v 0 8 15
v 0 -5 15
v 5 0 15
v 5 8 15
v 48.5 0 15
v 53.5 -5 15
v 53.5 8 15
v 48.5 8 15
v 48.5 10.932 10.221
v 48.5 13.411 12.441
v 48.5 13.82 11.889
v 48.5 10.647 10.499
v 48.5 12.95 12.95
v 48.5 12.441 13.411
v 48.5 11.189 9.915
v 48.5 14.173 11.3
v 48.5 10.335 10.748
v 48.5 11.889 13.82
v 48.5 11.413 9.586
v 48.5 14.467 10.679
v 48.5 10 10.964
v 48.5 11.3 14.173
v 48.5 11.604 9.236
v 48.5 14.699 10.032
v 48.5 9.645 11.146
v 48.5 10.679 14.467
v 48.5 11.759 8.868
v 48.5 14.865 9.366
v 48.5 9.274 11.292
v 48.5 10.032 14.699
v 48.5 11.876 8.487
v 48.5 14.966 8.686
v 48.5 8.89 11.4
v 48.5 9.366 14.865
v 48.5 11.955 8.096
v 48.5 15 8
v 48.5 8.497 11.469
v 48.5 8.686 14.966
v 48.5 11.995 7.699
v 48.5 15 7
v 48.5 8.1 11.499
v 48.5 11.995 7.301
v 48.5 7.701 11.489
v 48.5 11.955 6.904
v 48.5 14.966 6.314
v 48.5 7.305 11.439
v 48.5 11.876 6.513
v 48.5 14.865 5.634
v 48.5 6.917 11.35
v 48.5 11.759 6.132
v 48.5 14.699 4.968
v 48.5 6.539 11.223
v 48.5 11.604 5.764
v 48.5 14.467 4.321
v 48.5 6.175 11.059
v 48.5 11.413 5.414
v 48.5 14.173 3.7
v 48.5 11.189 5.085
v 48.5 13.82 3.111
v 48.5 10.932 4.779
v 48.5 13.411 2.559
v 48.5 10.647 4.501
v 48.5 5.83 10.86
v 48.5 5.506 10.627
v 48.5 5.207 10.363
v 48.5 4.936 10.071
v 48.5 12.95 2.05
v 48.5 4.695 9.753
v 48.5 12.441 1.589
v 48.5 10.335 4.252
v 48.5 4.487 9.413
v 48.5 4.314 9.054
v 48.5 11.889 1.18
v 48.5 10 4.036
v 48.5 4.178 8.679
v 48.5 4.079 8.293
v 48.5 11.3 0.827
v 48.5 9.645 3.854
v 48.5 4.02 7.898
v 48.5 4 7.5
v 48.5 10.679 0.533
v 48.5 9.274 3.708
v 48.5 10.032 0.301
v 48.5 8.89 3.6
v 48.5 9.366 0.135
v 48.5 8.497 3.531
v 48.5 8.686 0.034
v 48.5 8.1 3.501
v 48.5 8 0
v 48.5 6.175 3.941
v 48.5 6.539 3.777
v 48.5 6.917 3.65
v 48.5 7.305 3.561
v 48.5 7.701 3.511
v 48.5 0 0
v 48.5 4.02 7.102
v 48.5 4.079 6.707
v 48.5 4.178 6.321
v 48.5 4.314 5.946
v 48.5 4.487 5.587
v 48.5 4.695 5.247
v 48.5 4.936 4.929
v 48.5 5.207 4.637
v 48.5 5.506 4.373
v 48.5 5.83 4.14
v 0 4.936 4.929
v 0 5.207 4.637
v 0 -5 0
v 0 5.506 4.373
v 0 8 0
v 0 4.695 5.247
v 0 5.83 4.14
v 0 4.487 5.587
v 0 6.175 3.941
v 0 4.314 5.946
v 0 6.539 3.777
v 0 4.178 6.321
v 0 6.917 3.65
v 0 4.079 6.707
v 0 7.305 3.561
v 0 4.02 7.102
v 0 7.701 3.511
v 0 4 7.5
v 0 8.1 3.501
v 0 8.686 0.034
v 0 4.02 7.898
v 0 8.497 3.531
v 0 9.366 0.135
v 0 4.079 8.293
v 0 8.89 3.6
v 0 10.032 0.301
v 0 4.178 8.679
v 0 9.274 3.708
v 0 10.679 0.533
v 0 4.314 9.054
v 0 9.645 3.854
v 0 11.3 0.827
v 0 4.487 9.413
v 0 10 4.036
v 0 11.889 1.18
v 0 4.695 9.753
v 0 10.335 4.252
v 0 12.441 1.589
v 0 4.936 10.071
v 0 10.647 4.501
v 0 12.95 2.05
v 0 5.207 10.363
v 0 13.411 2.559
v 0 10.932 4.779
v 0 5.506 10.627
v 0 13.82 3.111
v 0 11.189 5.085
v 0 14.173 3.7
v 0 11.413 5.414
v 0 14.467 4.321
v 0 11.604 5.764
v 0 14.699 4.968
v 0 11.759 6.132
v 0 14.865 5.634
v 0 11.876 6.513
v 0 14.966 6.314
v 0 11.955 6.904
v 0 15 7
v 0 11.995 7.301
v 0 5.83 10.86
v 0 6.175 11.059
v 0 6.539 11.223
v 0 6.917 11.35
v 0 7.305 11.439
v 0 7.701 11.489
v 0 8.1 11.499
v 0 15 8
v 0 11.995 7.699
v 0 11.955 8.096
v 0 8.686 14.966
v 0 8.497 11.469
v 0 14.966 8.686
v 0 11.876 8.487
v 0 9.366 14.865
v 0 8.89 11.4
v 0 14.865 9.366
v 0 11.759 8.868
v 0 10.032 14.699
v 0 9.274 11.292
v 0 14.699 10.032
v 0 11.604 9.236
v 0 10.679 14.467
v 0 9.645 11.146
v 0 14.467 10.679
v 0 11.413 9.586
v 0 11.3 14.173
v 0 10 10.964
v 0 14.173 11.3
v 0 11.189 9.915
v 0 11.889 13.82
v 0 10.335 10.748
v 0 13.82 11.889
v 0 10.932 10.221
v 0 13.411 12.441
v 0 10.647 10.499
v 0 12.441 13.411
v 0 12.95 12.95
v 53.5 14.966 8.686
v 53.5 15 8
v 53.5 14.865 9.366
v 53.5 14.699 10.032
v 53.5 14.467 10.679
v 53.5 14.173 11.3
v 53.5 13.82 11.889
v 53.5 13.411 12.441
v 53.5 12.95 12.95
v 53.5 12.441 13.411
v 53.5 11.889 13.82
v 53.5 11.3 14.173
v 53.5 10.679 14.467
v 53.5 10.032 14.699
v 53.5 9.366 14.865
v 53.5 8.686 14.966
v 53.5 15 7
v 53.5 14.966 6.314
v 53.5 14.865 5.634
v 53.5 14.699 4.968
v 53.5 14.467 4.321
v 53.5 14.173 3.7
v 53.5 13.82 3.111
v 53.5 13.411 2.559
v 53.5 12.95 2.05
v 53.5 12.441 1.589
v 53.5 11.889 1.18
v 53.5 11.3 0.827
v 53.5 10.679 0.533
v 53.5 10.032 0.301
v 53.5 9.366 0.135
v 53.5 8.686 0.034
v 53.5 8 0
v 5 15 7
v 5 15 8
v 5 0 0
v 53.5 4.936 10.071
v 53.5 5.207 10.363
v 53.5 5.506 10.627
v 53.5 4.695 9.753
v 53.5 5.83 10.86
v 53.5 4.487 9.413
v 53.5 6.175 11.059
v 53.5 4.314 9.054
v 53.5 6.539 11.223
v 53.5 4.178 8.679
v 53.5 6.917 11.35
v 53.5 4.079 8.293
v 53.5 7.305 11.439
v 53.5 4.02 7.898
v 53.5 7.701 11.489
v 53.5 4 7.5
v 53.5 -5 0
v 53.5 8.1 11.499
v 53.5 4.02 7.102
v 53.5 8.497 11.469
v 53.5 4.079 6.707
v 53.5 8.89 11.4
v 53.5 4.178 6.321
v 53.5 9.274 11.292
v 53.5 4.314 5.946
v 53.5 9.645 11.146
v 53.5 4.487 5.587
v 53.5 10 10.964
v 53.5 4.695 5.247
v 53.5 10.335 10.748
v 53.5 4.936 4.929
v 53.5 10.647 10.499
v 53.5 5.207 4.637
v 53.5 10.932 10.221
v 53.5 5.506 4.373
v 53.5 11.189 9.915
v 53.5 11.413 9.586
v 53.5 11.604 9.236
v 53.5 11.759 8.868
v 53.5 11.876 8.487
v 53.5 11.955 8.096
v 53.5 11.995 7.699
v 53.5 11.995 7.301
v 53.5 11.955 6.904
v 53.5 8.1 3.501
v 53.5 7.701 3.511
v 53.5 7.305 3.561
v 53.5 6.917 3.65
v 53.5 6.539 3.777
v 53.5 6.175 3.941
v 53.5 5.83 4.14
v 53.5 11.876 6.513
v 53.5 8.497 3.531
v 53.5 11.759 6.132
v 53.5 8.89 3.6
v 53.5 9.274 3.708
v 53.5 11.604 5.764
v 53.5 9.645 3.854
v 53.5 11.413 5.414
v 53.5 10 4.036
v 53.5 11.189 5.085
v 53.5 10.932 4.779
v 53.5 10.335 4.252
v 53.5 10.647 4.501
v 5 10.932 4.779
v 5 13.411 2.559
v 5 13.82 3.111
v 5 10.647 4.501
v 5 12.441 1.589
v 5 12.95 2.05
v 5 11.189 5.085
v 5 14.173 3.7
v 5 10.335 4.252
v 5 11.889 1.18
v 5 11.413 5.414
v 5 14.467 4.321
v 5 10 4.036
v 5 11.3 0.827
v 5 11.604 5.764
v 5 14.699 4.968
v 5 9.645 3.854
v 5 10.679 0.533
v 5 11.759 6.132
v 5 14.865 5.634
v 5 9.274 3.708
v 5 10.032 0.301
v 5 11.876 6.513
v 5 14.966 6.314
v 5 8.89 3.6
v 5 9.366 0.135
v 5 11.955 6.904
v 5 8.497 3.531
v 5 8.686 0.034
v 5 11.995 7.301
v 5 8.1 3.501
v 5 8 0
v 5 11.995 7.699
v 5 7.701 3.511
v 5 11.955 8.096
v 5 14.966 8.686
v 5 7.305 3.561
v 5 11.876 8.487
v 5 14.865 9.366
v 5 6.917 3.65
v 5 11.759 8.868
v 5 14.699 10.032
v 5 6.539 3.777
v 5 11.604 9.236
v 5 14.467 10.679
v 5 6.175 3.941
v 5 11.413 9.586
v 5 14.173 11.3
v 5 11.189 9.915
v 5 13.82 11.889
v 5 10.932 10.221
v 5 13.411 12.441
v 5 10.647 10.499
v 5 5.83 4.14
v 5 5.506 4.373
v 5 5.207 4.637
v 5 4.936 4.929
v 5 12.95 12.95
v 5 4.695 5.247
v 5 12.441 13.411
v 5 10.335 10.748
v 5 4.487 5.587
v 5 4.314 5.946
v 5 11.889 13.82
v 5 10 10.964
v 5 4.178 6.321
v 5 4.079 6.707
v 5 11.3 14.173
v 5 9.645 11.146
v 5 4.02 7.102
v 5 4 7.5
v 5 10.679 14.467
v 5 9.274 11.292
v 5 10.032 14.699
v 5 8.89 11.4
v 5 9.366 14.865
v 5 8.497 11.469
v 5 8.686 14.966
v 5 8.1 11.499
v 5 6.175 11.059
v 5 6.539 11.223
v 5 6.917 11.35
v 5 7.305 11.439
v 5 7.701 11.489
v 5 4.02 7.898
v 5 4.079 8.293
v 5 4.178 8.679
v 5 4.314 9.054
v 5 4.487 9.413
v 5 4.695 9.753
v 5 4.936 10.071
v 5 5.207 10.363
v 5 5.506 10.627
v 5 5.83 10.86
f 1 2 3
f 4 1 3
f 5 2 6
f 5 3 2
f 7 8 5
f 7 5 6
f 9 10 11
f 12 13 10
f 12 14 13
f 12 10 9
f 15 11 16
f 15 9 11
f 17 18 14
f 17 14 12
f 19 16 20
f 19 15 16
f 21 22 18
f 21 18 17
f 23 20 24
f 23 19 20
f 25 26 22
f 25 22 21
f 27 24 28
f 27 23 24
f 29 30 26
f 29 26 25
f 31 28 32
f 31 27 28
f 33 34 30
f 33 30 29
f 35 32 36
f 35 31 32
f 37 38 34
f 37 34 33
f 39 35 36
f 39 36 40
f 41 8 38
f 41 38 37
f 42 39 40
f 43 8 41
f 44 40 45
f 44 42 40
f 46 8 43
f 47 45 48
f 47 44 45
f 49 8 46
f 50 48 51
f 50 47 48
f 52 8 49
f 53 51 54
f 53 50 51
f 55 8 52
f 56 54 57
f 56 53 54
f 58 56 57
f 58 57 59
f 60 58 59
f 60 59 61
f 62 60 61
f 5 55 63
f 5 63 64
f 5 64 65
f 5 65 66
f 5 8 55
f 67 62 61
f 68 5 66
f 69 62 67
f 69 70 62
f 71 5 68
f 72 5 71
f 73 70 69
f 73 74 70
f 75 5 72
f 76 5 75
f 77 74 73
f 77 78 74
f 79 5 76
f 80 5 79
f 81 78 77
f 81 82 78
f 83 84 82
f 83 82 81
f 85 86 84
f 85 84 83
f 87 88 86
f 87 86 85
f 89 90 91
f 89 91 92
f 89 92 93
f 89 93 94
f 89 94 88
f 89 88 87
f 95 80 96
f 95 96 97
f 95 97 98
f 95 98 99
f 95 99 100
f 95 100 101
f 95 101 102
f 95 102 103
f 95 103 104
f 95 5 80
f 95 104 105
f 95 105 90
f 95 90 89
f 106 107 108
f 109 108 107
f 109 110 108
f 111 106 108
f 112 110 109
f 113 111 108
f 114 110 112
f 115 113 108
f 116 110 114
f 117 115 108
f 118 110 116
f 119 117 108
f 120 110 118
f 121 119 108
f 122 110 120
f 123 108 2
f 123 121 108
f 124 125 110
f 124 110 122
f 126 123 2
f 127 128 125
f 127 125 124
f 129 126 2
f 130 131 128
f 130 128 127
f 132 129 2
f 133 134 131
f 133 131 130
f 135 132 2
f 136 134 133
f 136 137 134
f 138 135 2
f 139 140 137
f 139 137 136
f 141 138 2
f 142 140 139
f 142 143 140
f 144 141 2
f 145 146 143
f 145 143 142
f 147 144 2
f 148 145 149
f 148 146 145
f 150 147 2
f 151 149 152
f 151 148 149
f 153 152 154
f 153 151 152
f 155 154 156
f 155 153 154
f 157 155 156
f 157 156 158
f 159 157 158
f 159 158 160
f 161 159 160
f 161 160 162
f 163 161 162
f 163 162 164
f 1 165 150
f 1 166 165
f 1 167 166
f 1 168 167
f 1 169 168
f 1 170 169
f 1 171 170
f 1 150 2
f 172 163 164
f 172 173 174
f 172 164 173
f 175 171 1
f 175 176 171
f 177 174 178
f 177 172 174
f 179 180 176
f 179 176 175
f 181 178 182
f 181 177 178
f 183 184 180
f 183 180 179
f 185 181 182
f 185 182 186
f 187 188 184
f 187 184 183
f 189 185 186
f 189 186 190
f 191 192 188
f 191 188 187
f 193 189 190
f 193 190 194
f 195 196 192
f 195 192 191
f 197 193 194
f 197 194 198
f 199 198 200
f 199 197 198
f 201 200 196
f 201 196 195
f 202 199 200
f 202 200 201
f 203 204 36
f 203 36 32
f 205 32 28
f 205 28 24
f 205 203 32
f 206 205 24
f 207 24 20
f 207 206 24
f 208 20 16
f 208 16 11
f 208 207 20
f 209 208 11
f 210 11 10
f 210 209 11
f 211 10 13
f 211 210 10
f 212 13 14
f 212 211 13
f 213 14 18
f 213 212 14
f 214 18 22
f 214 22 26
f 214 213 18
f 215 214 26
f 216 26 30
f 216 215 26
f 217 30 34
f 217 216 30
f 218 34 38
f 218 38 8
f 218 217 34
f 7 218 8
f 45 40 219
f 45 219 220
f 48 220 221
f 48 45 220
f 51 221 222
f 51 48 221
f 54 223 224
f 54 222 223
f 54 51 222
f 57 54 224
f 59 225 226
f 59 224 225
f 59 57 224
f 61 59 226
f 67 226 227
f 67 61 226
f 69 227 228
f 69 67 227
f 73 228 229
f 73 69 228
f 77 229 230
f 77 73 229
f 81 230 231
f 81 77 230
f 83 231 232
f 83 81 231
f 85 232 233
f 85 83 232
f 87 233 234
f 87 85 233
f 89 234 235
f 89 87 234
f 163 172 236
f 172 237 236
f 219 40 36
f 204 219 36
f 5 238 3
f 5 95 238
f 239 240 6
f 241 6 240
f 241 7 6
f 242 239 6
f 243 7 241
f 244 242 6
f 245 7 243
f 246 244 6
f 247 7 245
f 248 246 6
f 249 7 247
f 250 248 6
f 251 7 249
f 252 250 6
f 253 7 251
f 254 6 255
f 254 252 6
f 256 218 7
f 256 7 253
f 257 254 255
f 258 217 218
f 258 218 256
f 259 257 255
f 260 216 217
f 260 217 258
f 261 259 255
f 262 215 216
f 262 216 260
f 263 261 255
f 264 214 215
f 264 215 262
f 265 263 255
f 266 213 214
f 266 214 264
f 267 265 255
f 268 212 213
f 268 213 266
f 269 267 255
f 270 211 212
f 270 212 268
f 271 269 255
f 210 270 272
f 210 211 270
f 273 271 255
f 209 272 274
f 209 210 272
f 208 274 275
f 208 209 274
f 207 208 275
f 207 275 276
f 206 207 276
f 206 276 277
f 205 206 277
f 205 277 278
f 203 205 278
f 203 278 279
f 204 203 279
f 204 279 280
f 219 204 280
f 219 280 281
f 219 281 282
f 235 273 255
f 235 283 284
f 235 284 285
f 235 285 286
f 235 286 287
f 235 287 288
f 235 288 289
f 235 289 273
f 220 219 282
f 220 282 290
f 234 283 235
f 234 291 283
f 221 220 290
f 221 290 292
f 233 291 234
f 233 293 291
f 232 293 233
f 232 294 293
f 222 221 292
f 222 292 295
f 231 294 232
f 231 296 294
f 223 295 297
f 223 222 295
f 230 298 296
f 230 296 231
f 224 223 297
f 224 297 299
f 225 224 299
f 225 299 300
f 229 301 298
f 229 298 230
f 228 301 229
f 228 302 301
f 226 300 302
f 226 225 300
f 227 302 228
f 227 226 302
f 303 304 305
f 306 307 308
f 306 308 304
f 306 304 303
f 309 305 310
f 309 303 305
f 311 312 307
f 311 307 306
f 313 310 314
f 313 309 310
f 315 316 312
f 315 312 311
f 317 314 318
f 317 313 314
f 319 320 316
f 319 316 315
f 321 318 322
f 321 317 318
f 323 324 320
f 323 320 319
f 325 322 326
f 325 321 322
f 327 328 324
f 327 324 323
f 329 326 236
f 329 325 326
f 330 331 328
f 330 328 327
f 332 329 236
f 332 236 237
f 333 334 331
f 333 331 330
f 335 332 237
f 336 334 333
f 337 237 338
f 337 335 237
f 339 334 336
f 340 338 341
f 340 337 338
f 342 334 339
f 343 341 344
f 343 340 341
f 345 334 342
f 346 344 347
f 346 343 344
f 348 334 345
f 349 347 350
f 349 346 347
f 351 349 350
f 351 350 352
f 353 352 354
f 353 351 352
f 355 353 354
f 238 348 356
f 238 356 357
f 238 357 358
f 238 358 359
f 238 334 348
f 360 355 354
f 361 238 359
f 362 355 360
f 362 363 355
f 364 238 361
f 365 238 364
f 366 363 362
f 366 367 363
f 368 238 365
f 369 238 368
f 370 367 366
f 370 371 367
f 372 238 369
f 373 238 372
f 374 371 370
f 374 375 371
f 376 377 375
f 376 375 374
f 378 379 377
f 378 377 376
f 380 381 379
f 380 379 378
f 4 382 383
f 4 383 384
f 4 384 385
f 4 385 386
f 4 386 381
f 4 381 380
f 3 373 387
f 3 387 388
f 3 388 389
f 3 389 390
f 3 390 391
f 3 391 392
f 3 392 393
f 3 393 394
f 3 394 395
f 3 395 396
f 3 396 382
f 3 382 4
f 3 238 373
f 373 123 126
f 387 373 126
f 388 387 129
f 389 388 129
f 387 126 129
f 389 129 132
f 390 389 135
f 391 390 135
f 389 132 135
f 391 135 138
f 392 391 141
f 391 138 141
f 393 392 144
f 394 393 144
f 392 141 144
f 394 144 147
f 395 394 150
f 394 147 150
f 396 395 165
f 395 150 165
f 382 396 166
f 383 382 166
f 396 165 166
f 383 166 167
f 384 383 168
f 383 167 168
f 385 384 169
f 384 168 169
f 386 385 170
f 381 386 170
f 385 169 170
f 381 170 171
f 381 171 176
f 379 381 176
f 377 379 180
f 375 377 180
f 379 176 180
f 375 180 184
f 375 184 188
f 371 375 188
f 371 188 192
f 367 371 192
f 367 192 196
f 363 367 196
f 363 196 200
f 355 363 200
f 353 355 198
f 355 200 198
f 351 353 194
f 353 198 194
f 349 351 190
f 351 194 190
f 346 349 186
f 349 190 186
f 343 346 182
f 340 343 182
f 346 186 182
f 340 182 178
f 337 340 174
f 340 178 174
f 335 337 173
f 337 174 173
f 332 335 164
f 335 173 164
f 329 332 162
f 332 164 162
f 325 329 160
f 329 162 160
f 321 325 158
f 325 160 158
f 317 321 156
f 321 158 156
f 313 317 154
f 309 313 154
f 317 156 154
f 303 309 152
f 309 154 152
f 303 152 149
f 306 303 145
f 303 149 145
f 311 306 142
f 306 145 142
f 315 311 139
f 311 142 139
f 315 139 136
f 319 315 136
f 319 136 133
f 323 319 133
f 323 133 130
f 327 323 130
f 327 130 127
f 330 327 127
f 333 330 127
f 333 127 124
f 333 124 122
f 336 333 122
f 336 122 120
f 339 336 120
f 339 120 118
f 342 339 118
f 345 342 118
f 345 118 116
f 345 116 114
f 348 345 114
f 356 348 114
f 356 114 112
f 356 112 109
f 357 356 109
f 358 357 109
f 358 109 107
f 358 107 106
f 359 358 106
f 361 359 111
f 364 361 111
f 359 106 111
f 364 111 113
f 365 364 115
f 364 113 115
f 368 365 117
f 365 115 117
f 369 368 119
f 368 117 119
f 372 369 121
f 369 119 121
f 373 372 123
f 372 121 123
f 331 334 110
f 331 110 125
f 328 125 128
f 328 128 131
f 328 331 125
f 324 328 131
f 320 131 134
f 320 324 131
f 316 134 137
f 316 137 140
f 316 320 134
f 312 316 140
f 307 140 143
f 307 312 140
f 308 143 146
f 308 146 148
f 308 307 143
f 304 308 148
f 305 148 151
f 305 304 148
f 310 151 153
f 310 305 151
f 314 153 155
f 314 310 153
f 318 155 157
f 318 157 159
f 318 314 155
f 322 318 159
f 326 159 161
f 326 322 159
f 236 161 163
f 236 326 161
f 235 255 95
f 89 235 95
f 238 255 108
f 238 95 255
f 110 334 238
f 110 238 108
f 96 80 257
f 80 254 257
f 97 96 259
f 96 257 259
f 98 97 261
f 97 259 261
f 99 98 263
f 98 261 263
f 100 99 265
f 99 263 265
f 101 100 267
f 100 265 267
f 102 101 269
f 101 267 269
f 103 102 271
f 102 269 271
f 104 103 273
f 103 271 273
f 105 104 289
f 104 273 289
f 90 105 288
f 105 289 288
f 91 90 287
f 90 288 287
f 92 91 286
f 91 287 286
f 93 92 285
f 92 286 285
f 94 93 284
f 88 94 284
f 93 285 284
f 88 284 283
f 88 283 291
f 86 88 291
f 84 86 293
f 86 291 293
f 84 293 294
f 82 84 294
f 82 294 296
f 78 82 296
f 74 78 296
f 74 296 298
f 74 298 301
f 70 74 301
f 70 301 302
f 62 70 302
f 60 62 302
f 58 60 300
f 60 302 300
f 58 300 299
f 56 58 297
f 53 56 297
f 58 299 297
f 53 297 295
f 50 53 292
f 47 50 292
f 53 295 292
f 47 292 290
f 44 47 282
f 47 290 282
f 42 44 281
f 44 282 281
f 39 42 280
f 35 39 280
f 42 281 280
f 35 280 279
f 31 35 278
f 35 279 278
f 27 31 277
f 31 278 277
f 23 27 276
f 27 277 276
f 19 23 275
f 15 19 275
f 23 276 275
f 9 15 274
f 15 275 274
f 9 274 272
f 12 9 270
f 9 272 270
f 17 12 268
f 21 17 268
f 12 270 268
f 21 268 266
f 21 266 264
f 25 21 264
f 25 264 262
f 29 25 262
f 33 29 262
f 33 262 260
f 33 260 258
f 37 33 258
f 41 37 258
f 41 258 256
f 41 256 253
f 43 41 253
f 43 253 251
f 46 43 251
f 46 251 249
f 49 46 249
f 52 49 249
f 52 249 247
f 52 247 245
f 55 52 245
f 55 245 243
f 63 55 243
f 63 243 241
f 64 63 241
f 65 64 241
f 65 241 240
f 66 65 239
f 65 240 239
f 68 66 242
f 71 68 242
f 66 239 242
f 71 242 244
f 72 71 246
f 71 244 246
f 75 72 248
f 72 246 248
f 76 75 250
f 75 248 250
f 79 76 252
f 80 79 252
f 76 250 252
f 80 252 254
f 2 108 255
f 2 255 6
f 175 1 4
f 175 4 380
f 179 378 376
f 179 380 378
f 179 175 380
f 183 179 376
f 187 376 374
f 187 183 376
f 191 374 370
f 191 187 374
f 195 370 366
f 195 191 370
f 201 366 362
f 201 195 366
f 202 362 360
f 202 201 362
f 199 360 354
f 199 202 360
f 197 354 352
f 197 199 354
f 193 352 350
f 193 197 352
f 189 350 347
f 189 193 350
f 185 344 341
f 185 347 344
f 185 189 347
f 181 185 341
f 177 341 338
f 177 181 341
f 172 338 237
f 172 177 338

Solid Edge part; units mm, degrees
sketch "Sketch1" plane through (0, 0, 0) normal (0, -1, 0) x (1, 0, 0)
  line L0 (53.5, 0) -> (0, 0)
  line L1 (0, 0) -> (0, 15)
  line L2 (0, 15) -> (53.5, 15)
  line L3 (53.5, 15) -> (53.5, 0)
extrude "Protrusion1" add sketch "Sketch1" along normal blind 5
sketch "Sketch2" plane through (18.75, 0, 7.5) normal (0, 1, 0) x (-1, 0, 0)
  line L0 (13.75, -7.5) -> (13.75, 7.5)
  line L1 (13.75, 7.5) -> (18.75, 7.5)
  line L2 (18.75, 7.5) -> (18.75, -7.5)
  line L3 (18.75, -7.5) -> (13.75, -7.5)
extrude "ExtrudedProtrusion_3" add sketch "Sketch2" along normal blind 15
sketch "Sketch3" plane through (0, 5, 7.5) normal (-1, 0, 0) x (0, -1, 0)
  circle A0 centre (-3, 0) radius 4
extrude "Cutout1" cut sketch "Sketch3" against normal through all
fillet "Round1" radius 7 2 edges at (2.5, 15, 15) (2.5, 15, 0)
mirror "Mirror1" about plane through (26.75, 5, 7.5) normal (-1, 0, 0) of "ExtrudedProtrusion_3", "Cutout1"
fillet "Round2" radius 7 2 edges at (51, 15, 15) (51, 15, 0)
